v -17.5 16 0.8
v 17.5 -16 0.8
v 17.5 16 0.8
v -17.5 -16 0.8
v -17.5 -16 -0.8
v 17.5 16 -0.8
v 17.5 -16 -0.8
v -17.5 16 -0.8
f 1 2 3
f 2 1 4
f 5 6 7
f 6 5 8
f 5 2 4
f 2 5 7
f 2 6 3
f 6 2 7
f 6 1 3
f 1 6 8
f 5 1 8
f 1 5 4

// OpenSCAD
// Parameters
length = 35; //[17.5:70:0.5]
width = 32; //[16:64:0.5]
thickness = 1.6; //[0.8:3.2:0.1]
corner_radius = 0; //[0:6:0.5]

// PCB Module - complete geometry
module mod() {
  color([0.0, 0.4, 0.2]) { // Green color for PCB
    // PCB Board
    cube([length, width, thickness], center=true);
  }
}

// Assembly
module assembly() {
  mod();
}

assembly();
